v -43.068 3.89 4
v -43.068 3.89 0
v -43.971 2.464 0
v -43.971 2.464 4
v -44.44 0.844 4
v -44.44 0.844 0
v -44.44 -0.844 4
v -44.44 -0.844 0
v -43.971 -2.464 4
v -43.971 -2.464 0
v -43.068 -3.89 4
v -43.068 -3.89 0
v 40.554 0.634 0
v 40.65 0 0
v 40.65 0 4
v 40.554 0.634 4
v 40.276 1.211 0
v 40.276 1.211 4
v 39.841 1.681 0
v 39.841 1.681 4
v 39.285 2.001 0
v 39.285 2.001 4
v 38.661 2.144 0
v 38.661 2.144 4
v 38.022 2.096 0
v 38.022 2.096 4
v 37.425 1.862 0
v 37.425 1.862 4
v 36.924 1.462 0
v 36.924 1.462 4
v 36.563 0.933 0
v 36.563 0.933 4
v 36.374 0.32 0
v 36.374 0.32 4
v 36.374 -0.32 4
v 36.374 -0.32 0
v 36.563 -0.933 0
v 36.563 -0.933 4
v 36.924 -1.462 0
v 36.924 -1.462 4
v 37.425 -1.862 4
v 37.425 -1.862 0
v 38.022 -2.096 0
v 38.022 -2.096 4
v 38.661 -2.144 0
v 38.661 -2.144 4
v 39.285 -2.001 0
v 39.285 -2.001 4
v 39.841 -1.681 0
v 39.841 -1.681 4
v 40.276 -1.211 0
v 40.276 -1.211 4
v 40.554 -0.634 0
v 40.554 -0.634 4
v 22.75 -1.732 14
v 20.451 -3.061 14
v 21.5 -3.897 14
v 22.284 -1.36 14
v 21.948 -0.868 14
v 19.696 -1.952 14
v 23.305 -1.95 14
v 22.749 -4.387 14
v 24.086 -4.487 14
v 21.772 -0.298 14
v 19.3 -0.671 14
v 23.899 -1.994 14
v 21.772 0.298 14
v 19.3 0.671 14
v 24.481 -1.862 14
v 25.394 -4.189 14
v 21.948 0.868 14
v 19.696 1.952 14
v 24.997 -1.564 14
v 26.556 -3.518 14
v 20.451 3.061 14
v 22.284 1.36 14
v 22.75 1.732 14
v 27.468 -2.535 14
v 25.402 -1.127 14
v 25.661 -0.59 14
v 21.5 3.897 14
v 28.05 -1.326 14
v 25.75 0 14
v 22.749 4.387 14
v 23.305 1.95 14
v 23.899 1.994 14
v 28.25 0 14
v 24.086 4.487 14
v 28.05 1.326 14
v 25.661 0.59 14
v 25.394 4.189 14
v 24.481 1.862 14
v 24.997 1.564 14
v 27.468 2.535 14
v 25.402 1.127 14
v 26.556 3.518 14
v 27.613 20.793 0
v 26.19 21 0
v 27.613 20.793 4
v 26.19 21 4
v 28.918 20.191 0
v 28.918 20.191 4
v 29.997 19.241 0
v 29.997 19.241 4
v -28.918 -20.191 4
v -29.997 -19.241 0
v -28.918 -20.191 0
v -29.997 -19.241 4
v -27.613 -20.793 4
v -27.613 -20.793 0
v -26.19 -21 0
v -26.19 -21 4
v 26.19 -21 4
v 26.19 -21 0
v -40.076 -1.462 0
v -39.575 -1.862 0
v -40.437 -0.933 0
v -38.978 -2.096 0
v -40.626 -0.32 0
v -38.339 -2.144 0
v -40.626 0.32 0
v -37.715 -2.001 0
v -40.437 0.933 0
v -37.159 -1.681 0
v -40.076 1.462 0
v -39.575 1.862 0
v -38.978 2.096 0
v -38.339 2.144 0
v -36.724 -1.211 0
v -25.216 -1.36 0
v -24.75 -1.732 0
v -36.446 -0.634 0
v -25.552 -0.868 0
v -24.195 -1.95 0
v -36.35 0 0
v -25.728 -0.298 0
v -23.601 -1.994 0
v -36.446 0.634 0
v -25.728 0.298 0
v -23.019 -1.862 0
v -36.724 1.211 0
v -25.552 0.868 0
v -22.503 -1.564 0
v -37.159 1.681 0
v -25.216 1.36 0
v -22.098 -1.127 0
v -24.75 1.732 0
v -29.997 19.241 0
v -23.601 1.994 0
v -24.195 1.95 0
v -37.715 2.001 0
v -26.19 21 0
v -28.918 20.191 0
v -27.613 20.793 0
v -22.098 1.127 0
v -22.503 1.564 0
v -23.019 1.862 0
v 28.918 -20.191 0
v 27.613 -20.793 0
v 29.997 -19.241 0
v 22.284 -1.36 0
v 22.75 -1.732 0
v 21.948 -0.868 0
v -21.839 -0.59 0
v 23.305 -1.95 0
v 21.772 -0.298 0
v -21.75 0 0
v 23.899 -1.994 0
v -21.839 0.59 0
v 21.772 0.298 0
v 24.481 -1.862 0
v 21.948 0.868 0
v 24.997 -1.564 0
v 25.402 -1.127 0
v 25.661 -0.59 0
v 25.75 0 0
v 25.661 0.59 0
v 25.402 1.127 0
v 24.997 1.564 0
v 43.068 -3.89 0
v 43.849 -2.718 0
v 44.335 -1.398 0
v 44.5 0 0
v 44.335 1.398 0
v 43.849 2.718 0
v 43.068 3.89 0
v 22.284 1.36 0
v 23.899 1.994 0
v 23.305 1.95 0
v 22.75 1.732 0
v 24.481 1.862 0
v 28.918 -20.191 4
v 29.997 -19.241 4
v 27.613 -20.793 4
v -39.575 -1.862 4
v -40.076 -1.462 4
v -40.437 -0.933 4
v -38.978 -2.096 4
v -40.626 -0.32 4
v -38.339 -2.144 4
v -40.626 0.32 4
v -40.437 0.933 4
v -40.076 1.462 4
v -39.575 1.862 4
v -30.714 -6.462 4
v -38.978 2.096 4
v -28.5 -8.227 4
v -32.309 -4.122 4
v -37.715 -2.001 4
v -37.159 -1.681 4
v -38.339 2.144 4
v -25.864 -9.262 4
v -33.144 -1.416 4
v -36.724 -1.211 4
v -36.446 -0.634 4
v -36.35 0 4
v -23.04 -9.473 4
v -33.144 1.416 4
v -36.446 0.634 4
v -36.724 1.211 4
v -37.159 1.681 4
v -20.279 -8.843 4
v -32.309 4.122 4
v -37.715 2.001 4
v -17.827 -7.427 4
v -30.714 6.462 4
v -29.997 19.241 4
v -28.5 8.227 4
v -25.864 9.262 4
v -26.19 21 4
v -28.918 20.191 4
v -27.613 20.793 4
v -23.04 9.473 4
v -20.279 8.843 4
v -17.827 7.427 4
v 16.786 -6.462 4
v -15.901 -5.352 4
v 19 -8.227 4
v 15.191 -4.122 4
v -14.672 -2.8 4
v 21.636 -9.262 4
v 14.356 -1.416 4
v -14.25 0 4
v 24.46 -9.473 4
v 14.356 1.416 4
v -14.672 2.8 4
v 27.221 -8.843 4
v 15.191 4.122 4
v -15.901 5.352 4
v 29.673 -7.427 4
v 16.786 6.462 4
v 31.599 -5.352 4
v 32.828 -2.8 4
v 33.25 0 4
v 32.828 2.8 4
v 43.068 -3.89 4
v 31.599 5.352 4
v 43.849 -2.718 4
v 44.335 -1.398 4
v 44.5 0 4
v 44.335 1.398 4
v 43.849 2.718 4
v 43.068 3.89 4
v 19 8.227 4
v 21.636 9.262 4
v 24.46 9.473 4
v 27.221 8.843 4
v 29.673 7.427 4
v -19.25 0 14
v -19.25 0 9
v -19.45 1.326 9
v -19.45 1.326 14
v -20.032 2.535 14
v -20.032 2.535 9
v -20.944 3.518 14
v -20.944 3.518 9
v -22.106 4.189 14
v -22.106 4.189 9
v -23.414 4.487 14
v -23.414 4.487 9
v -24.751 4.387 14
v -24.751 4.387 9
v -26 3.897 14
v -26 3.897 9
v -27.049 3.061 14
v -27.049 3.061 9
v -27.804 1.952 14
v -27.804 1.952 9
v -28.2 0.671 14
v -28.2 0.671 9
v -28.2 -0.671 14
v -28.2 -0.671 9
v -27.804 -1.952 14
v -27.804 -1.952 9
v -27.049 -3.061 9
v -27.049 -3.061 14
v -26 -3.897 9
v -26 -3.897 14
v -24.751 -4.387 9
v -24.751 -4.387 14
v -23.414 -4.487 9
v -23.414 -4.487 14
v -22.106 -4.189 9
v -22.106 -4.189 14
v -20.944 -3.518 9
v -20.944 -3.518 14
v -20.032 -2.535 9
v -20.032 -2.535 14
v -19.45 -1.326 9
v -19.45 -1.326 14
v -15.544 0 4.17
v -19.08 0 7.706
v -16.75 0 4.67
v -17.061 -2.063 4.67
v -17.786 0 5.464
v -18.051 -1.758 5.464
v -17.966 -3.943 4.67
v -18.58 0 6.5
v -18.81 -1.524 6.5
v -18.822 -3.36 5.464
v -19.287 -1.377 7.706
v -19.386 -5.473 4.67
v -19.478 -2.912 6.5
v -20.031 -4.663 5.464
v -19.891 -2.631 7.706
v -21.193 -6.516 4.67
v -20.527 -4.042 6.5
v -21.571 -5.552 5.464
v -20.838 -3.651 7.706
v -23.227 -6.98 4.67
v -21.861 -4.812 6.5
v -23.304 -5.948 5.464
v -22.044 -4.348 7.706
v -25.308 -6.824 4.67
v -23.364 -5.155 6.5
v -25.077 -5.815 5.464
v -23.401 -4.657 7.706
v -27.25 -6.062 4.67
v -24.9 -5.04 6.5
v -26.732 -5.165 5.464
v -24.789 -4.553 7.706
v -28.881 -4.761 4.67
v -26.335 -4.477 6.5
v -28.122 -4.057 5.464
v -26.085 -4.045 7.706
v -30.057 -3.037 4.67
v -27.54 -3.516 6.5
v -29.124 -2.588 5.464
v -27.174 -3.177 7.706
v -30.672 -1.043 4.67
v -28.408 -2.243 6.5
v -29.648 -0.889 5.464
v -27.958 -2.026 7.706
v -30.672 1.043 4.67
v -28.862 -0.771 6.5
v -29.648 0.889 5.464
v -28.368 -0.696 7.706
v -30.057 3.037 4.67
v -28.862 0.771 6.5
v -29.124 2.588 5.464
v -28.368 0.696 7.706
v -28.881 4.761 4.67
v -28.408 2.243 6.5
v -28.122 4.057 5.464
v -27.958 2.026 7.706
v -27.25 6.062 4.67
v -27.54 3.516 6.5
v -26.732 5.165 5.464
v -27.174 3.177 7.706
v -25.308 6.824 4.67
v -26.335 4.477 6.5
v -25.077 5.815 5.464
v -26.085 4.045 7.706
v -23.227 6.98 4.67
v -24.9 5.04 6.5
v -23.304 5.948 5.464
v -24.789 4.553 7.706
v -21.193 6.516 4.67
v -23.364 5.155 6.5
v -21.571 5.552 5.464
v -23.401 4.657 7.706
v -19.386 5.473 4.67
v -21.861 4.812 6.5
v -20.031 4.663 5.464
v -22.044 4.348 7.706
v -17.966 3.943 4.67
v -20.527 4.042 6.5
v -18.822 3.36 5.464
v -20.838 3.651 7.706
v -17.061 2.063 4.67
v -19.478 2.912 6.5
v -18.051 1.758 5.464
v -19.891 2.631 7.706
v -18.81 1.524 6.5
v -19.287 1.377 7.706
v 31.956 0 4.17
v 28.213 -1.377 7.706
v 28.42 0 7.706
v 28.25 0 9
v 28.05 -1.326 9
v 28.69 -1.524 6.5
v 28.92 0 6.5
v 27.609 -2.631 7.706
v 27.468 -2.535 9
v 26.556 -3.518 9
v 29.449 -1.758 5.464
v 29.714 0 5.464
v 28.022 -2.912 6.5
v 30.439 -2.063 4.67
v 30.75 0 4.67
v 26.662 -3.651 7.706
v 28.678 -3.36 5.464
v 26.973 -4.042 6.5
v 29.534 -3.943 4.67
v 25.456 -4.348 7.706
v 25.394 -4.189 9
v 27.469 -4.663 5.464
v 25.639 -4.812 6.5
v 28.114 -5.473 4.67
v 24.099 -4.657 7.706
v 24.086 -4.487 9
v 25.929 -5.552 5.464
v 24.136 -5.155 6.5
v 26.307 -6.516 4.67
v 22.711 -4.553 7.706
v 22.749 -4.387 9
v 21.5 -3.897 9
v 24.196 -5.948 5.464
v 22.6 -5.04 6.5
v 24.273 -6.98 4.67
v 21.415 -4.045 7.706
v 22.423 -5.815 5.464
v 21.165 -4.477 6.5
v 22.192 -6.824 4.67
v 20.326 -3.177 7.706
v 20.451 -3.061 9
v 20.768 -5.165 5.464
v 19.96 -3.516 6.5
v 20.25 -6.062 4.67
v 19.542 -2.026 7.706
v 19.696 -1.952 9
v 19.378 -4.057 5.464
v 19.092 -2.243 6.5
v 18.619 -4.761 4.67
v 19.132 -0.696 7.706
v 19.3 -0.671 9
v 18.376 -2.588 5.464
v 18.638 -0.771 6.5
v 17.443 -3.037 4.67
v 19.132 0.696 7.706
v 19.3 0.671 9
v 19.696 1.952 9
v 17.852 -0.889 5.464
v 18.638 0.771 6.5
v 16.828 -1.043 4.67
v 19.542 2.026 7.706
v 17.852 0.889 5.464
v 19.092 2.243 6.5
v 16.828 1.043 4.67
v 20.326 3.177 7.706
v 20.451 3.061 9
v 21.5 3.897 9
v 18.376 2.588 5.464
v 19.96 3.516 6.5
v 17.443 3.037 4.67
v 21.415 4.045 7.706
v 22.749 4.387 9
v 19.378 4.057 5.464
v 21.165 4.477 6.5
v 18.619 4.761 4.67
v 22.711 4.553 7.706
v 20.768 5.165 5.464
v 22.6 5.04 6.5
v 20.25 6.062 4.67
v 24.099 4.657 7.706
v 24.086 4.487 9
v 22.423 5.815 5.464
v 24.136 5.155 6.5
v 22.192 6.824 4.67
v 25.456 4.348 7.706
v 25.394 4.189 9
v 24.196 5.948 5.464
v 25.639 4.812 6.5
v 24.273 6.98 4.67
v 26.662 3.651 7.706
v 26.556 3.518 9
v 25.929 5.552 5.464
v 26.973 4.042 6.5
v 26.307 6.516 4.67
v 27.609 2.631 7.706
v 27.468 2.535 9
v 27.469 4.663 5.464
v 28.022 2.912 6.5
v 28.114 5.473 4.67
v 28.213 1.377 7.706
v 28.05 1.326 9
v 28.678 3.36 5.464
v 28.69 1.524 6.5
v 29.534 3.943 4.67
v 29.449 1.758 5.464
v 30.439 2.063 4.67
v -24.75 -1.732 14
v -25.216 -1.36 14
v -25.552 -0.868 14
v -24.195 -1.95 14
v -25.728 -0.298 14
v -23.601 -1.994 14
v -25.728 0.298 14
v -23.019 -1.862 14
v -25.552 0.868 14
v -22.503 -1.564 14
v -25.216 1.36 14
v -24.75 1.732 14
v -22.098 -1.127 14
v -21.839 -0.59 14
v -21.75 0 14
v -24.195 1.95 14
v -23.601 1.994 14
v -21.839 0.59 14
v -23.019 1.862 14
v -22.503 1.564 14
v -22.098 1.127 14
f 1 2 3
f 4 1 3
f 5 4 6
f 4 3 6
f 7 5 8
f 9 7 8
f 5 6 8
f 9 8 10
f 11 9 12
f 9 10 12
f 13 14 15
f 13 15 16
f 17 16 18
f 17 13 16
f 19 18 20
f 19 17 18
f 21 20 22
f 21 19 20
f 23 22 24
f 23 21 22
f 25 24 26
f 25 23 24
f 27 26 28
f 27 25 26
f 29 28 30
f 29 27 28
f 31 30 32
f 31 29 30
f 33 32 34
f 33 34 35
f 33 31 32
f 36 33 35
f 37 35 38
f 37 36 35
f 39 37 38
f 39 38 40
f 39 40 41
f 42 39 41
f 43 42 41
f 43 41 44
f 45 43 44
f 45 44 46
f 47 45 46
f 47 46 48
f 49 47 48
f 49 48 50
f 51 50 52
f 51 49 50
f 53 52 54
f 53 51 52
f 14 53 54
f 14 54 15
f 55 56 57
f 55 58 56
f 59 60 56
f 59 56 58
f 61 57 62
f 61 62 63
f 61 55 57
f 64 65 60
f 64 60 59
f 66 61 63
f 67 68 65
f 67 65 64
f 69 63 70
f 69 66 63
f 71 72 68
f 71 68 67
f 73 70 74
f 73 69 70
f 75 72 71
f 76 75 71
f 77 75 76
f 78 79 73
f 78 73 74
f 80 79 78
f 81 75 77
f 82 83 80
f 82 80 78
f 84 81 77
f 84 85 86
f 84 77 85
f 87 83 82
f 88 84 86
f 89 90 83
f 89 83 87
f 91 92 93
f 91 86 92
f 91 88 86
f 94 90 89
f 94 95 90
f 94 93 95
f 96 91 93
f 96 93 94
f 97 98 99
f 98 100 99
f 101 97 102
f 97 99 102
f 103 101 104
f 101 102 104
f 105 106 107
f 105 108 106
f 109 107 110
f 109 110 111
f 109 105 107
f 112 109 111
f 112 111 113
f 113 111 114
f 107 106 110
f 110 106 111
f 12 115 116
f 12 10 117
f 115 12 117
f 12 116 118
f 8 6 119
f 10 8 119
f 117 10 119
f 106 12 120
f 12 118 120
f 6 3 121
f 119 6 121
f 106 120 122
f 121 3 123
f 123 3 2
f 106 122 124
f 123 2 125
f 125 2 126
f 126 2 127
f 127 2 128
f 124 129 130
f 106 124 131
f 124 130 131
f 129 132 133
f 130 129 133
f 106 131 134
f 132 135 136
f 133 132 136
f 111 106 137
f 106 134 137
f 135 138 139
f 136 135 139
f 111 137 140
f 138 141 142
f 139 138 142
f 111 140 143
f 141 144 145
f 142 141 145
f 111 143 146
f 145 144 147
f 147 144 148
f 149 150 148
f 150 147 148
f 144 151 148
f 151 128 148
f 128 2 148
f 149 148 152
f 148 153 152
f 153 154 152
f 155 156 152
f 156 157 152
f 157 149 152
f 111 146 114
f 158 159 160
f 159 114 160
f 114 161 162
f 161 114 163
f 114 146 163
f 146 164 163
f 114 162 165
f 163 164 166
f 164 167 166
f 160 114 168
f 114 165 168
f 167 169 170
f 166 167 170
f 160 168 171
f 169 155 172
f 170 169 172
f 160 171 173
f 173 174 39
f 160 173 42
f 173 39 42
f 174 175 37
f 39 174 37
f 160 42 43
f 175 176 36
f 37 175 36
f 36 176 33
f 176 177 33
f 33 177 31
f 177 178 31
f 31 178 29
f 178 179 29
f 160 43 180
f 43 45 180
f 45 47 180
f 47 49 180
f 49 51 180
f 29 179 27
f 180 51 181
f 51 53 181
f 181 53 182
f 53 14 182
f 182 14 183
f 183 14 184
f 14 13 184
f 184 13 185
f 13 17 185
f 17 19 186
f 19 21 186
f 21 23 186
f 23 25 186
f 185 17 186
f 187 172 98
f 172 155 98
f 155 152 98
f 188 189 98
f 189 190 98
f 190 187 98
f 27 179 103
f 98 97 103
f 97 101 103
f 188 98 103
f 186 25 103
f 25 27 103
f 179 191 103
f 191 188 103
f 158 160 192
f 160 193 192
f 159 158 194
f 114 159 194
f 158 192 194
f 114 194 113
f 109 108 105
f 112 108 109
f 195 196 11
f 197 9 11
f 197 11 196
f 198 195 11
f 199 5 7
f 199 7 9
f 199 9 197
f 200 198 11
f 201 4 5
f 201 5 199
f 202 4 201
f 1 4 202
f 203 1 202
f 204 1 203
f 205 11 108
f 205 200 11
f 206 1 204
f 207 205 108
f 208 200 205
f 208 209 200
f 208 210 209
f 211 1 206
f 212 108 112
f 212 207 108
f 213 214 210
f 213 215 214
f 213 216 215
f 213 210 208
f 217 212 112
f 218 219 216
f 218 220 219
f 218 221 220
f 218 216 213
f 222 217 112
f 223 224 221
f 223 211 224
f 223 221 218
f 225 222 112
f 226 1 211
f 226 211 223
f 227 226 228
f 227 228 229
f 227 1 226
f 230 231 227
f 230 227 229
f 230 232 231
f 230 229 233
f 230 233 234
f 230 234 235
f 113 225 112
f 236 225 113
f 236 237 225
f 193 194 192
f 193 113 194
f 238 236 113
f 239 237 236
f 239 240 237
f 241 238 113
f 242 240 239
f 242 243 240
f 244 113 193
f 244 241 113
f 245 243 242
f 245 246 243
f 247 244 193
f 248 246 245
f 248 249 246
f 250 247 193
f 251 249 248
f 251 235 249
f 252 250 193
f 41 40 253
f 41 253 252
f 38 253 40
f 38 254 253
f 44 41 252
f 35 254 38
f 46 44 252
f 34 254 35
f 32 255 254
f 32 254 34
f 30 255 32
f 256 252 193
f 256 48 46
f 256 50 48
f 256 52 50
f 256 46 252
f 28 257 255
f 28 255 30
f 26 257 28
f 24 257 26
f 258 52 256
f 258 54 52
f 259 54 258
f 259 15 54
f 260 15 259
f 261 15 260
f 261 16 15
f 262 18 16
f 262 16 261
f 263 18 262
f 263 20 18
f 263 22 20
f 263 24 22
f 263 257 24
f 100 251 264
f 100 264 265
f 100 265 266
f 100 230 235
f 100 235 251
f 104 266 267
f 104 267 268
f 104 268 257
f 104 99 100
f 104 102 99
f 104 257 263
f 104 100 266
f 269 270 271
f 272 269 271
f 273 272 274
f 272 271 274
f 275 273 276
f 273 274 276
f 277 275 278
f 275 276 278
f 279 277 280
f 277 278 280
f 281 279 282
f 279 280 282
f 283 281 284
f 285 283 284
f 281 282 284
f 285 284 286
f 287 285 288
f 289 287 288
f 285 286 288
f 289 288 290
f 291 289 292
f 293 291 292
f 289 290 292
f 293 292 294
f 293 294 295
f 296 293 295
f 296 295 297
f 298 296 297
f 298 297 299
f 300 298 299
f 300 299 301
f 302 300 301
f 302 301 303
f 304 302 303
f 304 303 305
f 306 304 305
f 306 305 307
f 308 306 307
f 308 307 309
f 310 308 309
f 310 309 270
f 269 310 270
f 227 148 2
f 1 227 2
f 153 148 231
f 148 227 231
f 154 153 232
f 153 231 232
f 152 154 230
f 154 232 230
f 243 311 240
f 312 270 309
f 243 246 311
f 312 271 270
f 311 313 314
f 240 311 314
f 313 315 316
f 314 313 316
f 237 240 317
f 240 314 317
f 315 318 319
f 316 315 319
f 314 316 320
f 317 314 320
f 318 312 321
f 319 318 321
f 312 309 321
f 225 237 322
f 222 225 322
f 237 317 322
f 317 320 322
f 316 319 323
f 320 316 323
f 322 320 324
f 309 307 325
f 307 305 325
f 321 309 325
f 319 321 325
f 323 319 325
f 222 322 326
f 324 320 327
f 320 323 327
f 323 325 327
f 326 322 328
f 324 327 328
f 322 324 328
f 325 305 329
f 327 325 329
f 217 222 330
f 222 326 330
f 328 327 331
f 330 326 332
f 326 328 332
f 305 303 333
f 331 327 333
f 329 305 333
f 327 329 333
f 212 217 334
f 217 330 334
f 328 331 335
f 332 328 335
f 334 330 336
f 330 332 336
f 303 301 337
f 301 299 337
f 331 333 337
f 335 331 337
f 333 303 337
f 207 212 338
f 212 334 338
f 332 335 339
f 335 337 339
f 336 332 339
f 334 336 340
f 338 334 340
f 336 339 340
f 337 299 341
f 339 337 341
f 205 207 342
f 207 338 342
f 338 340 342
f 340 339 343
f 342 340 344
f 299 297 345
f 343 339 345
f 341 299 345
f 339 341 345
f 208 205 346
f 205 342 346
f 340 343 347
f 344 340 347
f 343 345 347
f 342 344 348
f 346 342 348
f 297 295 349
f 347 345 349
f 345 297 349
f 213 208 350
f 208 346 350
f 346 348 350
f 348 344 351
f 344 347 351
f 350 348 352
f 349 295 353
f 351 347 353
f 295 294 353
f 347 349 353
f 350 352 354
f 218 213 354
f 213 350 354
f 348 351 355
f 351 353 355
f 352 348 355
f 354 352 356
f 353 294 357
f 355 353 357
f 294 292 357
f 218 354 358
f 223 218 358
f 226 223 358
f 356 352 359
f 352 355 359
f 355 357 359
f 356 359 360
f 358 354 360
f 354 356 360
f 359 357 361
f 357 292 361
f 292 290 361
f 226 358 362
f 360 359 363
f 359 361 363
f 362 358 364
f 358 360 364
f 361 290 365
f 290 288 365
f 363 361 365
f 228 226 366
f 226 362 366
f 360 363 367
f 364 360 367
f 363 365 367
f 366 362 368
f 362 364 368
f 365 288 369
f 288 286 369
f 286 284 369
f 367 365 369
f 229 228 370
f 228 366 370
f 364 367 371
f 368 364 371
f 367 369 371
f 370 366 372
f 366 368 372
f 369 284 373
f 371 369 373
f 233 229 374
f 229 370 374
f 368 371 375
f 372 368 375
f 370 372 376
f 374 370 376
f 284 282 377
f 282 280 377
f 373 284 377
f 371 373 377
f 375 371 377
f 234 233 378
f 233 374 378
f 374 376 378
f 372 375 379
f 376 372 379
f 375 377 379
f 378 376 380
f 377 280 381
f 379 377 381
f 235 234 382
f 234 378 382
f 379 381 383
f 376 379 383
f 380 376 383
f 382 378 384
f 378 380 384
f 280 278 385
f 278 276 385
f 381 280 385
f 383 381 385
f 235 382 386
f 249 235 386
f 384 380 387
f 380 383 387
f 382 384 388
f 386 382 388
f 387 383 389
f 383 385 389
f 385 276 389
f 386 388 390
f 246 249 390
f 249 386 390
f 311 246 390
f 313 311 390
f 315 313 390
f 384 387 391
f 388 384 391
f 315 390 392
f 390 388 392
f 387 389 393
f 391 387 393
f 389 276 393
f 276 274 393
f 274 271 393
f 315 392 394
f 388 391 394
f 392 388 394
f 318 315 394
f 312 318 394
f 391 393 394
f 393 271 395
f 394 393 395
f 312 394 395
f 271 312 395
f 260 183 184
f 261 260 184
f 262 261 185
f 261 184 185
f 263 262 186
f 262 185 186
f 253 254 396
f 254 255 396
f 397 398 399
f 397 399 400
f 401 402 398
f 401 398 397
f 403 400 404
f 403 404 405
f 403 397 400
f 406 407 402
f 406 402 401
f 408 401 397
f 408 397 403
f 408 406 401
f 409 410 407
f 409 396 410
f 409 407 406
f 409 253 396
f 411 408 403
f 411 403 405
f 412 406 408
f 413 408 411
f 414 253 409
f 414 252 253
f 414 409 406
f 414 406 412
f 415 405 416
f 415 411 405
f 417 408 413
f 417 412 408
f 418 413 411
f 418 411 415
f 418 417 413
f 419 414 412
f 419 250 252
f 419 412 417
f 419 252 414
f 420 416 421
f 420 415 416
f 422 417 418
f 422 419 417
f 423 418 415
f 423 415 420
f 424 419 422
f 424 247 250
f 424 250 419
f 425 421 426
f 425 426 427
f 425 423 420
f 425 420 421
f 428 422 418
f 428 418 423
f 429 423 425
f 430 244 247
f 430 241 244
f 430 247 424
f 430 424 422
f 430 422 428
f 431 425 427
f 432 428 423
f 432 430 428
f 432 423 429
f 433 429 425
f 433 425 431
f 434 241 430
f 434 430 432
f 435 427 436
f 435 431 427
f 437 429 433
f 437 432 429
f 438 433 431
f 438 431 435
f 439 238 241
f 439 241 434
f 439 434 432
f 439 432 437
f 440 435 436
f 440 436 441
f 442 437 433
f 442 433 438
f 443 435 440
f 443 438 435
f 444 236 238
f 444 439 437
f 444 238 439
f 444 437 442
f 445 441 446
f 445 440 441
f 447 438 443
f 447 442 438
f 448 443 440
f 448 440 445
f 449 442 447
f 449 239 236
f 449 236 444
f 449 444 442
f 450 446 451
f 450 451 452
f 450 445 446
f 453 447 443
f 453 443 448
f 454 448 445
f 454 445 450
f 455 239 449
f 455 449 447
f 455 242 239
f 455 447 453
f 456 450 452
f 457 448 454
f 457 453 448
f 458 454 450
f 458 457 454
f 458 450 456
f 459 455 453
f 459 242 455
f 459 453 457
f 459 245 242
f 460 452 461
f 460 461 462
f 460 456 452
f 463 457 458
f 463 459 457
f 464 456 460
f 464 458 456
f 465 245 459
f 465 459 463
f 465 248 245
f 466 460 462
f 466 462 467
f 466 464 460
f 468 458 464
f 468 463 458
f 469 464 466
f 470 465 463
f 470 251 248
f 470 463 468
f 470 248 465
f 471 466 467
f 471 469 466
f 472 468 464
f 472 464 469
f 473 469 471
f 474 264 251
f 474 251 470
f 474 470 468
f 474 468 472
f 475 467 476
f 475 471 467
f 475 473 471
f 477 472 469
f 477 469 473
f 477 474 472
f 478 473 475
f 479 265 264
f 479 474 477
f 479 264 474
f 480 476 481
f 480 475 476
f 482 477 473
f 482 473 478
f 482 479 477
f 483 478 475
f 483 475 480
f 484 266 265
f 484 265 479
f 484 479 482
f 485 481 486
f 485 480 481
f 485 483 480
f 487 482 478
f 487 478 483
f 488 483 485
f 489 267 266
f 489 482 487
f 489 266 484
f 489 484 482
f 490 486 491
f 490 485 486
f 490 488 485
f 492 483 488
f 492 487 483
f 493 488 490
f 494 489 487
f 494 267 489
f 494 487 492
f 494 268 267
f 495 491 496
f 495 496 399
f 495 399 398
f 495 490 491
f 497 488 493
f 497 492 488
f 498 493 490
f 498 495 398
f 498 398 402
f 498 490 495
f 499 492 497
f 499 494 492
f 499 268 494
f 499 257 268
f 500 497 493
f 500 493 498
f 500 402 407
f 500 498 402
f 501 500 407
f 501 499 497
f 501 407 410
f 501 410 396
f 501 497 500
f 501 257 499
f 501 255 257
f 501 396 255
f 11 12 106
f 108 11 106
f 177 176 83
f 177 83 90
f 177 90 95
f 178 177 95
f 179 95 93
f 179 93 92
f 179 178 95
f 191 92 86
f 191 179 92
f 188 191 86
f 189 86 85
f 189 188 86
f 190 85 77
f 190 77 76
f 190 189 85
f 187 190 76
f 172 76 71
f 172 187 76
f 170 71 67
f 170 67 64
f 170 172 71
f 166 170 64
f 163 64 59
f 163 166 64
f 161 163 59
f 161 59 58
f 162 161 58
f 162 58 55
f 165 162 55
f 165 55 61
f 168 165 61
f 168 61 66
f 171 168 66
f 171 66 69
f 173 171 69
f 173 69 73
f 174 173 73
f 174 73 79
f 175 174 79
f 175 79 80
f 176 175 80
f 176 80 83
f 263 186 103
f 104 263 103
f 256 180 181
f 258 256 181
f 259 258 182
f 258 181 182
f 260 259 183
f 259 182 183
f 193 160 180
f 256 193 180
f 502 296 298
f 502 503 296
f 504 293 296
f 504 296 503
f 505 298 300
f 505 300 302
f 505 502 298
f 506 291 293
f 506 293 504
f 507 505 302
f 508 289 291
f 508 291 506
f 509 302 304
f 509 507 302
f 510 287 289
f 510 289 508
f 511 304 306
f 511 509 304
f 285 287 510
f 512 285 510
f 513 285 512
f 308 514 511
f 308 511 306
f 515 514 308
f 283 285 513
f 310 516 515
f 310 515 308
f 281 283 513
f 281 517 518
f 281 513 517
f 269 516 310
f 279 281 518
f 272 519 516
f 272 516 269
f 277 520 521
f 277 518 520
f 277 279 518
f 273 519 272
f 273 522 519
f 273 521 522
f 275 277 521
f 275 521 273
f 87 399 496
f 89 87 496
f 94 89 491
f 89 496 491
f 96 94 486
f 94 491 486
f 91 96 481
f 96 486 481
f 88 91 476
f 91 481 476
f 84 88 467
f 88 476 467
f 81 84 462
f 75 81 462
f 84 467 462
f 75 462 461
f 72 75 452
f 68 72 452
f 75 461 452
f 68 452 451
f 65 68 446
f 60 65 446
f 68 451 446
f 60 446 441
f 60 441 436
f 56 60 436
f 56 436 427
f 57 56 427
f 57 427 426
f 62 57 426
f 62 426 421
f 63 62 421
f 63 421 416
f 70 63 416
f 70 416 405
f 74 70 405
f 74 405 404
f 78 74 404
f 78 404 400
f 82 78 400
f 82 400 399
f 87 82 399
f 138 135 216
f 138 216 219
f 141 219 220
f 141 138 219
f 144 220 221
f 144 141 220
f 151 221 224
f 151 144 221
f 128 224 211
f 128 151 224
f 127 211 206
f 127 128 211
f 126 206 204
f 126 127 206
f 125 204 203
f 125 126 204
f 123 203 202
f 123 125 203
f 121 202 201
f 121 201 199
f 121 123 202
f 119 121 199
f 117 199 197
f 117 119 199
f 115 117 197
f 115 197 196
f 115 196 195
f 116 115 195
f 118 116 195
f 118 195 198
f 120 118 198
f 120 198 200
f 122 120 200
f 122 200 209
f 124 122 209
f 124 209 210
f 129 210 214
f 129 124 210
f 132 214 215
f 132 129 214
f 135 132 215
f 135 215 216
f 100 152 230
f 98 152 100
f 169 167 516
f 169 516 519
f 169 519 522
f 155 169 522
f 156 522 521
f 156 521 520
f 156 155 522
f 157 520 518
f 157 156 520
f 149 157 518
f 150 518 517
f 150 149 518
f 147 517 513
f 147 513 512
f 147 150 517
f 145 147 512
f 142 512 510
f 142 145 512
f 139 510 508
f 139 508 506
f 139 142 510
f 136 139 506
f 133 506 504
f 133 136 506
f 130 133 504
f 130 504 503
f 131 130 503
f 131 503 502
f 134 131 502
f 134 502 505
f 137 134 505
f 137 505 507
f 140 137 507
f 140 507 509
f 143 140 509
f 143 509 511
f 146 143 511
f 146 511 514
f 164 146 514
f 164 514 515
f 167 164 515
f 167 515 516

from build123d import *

# Parameters (mm, degrees)
F0_W     = 57
F0_H     = 42
F0_R     = 4.5
F0_R_2   = 2.15
F0_R_3   = 2
F1_DEPTH = 4
F2_DEPTH = 14
F3_R     = 5


with BuildPart() as f1:
    # F0 (on Top) → F1 (new body)
    with BuildSketch(Plane.XY):
        Rectangle(F0_W, F0_H)
        with Locations((-23.75, 0)):
            Circle(F0_R, mode=Mode.SUBTRACT)
        with Locations((23.75, 0)):
            Circle(F0_R, mode=Mode.SUBTRACT)
        with BuildLine():
            Line((-43.068388, -3.889709), (-28.5, -21))
            Line((-28.5, -21), (-28.5, 21))
            Line((-28.5, 21), (-43.068388, 3.889709))
            ThreePointArc((-43.068388, 3.889709), (-36.427601, 5.630734), (-32.5, 0))
            ThreePointArc((-32.5, 0), (-36.427601, -5.630734), (-43.068388, -3.889709))
        make_face()
        with BuildLine():
            Line((28.5, 21), (28.5, -21))
            Line((28.5, -21), (43.068388, -3.889709))
            ThreePointArc((43.068388, -3.889709), (32.5, 0), (43.068388, 3.889709))
            Line((43.068388, 3.889709), (28.5, 21))
        make_face()
        with BuildLine():
            ThreePointArc((-43.068388, 3.889709), (-44.5, 0), (-43.068388, -3.889709))
            ThreePointArc((-43.068388, -3.889709), (-36.427601, -5.630734), (-32.5, 0))
            ThreePointArc((-32.5, 0), (-36.427601, 5.630734), (-43.068388, 3.889709))
        make_face()
        with Locations((-38.5, 0)):
            Circle(F0_R_2, mode=Mode.SUBTRACT)
        with BuildLine():
            ThreePointArc((43.068388, 3.889709), (32.5, 0), (43.068388, -3.889709))
            ThreePointArc((43.068388, -3.889709), (44.130734, -2.072399), (44.5, 0))
            ThreePointArc((44.5, 0), (44.130734, 2.072399), (43.068388, 3.889709))
        make_face()
        with Locations((38.5, 0)):
            Circle(F0_R_2, mode=Mode.SUBTRACT)
        with Locations((-23.75, 0)):
            Circle(F0_R)
        with Locations((-23.75, 0)):
            Circle(F0_R_3, mode=Mode.SUBTRACT)
        with Locations((23.75, 0)):
            Circle(F0_R)
        with Locations((23.75, 0)):
            Circle(F0_R_3, mode=Mode.SUBTRACT)
    extrude(amount=F1_DEPTH)

    # F0 (on Top) → F2 (join)
    with BuildSketch(Plane.XY):
        with Locations((-23.75, 0)):
            Circle(F0_R)
        with Locations((-23.75, 0)):
            Circle(F0_R_3, mode=Mode.SUBTRACT)
        with Locations((23.75, 0)):
            Circle(F0_R)
        with Locations((23.75, 0)):
            Circle(F0_R_3, mode=Mode.SUBTRACT)
    extrude(amount=F2_DEPTH)

    # F3
    f3_edges = [f1.edges().sort_by_distance(p)[0] for p in [
        (-28.5, 21, 2),
        (-28.5, -21, 2),
        (28.5, -21, 2),
        (28.5, 21, 2),
        (-28.25, 0, 4),
        (19.25, 0, 4),
    ]]
    fillet(f3_edges, radius=F3_R)


solid = f1.part
